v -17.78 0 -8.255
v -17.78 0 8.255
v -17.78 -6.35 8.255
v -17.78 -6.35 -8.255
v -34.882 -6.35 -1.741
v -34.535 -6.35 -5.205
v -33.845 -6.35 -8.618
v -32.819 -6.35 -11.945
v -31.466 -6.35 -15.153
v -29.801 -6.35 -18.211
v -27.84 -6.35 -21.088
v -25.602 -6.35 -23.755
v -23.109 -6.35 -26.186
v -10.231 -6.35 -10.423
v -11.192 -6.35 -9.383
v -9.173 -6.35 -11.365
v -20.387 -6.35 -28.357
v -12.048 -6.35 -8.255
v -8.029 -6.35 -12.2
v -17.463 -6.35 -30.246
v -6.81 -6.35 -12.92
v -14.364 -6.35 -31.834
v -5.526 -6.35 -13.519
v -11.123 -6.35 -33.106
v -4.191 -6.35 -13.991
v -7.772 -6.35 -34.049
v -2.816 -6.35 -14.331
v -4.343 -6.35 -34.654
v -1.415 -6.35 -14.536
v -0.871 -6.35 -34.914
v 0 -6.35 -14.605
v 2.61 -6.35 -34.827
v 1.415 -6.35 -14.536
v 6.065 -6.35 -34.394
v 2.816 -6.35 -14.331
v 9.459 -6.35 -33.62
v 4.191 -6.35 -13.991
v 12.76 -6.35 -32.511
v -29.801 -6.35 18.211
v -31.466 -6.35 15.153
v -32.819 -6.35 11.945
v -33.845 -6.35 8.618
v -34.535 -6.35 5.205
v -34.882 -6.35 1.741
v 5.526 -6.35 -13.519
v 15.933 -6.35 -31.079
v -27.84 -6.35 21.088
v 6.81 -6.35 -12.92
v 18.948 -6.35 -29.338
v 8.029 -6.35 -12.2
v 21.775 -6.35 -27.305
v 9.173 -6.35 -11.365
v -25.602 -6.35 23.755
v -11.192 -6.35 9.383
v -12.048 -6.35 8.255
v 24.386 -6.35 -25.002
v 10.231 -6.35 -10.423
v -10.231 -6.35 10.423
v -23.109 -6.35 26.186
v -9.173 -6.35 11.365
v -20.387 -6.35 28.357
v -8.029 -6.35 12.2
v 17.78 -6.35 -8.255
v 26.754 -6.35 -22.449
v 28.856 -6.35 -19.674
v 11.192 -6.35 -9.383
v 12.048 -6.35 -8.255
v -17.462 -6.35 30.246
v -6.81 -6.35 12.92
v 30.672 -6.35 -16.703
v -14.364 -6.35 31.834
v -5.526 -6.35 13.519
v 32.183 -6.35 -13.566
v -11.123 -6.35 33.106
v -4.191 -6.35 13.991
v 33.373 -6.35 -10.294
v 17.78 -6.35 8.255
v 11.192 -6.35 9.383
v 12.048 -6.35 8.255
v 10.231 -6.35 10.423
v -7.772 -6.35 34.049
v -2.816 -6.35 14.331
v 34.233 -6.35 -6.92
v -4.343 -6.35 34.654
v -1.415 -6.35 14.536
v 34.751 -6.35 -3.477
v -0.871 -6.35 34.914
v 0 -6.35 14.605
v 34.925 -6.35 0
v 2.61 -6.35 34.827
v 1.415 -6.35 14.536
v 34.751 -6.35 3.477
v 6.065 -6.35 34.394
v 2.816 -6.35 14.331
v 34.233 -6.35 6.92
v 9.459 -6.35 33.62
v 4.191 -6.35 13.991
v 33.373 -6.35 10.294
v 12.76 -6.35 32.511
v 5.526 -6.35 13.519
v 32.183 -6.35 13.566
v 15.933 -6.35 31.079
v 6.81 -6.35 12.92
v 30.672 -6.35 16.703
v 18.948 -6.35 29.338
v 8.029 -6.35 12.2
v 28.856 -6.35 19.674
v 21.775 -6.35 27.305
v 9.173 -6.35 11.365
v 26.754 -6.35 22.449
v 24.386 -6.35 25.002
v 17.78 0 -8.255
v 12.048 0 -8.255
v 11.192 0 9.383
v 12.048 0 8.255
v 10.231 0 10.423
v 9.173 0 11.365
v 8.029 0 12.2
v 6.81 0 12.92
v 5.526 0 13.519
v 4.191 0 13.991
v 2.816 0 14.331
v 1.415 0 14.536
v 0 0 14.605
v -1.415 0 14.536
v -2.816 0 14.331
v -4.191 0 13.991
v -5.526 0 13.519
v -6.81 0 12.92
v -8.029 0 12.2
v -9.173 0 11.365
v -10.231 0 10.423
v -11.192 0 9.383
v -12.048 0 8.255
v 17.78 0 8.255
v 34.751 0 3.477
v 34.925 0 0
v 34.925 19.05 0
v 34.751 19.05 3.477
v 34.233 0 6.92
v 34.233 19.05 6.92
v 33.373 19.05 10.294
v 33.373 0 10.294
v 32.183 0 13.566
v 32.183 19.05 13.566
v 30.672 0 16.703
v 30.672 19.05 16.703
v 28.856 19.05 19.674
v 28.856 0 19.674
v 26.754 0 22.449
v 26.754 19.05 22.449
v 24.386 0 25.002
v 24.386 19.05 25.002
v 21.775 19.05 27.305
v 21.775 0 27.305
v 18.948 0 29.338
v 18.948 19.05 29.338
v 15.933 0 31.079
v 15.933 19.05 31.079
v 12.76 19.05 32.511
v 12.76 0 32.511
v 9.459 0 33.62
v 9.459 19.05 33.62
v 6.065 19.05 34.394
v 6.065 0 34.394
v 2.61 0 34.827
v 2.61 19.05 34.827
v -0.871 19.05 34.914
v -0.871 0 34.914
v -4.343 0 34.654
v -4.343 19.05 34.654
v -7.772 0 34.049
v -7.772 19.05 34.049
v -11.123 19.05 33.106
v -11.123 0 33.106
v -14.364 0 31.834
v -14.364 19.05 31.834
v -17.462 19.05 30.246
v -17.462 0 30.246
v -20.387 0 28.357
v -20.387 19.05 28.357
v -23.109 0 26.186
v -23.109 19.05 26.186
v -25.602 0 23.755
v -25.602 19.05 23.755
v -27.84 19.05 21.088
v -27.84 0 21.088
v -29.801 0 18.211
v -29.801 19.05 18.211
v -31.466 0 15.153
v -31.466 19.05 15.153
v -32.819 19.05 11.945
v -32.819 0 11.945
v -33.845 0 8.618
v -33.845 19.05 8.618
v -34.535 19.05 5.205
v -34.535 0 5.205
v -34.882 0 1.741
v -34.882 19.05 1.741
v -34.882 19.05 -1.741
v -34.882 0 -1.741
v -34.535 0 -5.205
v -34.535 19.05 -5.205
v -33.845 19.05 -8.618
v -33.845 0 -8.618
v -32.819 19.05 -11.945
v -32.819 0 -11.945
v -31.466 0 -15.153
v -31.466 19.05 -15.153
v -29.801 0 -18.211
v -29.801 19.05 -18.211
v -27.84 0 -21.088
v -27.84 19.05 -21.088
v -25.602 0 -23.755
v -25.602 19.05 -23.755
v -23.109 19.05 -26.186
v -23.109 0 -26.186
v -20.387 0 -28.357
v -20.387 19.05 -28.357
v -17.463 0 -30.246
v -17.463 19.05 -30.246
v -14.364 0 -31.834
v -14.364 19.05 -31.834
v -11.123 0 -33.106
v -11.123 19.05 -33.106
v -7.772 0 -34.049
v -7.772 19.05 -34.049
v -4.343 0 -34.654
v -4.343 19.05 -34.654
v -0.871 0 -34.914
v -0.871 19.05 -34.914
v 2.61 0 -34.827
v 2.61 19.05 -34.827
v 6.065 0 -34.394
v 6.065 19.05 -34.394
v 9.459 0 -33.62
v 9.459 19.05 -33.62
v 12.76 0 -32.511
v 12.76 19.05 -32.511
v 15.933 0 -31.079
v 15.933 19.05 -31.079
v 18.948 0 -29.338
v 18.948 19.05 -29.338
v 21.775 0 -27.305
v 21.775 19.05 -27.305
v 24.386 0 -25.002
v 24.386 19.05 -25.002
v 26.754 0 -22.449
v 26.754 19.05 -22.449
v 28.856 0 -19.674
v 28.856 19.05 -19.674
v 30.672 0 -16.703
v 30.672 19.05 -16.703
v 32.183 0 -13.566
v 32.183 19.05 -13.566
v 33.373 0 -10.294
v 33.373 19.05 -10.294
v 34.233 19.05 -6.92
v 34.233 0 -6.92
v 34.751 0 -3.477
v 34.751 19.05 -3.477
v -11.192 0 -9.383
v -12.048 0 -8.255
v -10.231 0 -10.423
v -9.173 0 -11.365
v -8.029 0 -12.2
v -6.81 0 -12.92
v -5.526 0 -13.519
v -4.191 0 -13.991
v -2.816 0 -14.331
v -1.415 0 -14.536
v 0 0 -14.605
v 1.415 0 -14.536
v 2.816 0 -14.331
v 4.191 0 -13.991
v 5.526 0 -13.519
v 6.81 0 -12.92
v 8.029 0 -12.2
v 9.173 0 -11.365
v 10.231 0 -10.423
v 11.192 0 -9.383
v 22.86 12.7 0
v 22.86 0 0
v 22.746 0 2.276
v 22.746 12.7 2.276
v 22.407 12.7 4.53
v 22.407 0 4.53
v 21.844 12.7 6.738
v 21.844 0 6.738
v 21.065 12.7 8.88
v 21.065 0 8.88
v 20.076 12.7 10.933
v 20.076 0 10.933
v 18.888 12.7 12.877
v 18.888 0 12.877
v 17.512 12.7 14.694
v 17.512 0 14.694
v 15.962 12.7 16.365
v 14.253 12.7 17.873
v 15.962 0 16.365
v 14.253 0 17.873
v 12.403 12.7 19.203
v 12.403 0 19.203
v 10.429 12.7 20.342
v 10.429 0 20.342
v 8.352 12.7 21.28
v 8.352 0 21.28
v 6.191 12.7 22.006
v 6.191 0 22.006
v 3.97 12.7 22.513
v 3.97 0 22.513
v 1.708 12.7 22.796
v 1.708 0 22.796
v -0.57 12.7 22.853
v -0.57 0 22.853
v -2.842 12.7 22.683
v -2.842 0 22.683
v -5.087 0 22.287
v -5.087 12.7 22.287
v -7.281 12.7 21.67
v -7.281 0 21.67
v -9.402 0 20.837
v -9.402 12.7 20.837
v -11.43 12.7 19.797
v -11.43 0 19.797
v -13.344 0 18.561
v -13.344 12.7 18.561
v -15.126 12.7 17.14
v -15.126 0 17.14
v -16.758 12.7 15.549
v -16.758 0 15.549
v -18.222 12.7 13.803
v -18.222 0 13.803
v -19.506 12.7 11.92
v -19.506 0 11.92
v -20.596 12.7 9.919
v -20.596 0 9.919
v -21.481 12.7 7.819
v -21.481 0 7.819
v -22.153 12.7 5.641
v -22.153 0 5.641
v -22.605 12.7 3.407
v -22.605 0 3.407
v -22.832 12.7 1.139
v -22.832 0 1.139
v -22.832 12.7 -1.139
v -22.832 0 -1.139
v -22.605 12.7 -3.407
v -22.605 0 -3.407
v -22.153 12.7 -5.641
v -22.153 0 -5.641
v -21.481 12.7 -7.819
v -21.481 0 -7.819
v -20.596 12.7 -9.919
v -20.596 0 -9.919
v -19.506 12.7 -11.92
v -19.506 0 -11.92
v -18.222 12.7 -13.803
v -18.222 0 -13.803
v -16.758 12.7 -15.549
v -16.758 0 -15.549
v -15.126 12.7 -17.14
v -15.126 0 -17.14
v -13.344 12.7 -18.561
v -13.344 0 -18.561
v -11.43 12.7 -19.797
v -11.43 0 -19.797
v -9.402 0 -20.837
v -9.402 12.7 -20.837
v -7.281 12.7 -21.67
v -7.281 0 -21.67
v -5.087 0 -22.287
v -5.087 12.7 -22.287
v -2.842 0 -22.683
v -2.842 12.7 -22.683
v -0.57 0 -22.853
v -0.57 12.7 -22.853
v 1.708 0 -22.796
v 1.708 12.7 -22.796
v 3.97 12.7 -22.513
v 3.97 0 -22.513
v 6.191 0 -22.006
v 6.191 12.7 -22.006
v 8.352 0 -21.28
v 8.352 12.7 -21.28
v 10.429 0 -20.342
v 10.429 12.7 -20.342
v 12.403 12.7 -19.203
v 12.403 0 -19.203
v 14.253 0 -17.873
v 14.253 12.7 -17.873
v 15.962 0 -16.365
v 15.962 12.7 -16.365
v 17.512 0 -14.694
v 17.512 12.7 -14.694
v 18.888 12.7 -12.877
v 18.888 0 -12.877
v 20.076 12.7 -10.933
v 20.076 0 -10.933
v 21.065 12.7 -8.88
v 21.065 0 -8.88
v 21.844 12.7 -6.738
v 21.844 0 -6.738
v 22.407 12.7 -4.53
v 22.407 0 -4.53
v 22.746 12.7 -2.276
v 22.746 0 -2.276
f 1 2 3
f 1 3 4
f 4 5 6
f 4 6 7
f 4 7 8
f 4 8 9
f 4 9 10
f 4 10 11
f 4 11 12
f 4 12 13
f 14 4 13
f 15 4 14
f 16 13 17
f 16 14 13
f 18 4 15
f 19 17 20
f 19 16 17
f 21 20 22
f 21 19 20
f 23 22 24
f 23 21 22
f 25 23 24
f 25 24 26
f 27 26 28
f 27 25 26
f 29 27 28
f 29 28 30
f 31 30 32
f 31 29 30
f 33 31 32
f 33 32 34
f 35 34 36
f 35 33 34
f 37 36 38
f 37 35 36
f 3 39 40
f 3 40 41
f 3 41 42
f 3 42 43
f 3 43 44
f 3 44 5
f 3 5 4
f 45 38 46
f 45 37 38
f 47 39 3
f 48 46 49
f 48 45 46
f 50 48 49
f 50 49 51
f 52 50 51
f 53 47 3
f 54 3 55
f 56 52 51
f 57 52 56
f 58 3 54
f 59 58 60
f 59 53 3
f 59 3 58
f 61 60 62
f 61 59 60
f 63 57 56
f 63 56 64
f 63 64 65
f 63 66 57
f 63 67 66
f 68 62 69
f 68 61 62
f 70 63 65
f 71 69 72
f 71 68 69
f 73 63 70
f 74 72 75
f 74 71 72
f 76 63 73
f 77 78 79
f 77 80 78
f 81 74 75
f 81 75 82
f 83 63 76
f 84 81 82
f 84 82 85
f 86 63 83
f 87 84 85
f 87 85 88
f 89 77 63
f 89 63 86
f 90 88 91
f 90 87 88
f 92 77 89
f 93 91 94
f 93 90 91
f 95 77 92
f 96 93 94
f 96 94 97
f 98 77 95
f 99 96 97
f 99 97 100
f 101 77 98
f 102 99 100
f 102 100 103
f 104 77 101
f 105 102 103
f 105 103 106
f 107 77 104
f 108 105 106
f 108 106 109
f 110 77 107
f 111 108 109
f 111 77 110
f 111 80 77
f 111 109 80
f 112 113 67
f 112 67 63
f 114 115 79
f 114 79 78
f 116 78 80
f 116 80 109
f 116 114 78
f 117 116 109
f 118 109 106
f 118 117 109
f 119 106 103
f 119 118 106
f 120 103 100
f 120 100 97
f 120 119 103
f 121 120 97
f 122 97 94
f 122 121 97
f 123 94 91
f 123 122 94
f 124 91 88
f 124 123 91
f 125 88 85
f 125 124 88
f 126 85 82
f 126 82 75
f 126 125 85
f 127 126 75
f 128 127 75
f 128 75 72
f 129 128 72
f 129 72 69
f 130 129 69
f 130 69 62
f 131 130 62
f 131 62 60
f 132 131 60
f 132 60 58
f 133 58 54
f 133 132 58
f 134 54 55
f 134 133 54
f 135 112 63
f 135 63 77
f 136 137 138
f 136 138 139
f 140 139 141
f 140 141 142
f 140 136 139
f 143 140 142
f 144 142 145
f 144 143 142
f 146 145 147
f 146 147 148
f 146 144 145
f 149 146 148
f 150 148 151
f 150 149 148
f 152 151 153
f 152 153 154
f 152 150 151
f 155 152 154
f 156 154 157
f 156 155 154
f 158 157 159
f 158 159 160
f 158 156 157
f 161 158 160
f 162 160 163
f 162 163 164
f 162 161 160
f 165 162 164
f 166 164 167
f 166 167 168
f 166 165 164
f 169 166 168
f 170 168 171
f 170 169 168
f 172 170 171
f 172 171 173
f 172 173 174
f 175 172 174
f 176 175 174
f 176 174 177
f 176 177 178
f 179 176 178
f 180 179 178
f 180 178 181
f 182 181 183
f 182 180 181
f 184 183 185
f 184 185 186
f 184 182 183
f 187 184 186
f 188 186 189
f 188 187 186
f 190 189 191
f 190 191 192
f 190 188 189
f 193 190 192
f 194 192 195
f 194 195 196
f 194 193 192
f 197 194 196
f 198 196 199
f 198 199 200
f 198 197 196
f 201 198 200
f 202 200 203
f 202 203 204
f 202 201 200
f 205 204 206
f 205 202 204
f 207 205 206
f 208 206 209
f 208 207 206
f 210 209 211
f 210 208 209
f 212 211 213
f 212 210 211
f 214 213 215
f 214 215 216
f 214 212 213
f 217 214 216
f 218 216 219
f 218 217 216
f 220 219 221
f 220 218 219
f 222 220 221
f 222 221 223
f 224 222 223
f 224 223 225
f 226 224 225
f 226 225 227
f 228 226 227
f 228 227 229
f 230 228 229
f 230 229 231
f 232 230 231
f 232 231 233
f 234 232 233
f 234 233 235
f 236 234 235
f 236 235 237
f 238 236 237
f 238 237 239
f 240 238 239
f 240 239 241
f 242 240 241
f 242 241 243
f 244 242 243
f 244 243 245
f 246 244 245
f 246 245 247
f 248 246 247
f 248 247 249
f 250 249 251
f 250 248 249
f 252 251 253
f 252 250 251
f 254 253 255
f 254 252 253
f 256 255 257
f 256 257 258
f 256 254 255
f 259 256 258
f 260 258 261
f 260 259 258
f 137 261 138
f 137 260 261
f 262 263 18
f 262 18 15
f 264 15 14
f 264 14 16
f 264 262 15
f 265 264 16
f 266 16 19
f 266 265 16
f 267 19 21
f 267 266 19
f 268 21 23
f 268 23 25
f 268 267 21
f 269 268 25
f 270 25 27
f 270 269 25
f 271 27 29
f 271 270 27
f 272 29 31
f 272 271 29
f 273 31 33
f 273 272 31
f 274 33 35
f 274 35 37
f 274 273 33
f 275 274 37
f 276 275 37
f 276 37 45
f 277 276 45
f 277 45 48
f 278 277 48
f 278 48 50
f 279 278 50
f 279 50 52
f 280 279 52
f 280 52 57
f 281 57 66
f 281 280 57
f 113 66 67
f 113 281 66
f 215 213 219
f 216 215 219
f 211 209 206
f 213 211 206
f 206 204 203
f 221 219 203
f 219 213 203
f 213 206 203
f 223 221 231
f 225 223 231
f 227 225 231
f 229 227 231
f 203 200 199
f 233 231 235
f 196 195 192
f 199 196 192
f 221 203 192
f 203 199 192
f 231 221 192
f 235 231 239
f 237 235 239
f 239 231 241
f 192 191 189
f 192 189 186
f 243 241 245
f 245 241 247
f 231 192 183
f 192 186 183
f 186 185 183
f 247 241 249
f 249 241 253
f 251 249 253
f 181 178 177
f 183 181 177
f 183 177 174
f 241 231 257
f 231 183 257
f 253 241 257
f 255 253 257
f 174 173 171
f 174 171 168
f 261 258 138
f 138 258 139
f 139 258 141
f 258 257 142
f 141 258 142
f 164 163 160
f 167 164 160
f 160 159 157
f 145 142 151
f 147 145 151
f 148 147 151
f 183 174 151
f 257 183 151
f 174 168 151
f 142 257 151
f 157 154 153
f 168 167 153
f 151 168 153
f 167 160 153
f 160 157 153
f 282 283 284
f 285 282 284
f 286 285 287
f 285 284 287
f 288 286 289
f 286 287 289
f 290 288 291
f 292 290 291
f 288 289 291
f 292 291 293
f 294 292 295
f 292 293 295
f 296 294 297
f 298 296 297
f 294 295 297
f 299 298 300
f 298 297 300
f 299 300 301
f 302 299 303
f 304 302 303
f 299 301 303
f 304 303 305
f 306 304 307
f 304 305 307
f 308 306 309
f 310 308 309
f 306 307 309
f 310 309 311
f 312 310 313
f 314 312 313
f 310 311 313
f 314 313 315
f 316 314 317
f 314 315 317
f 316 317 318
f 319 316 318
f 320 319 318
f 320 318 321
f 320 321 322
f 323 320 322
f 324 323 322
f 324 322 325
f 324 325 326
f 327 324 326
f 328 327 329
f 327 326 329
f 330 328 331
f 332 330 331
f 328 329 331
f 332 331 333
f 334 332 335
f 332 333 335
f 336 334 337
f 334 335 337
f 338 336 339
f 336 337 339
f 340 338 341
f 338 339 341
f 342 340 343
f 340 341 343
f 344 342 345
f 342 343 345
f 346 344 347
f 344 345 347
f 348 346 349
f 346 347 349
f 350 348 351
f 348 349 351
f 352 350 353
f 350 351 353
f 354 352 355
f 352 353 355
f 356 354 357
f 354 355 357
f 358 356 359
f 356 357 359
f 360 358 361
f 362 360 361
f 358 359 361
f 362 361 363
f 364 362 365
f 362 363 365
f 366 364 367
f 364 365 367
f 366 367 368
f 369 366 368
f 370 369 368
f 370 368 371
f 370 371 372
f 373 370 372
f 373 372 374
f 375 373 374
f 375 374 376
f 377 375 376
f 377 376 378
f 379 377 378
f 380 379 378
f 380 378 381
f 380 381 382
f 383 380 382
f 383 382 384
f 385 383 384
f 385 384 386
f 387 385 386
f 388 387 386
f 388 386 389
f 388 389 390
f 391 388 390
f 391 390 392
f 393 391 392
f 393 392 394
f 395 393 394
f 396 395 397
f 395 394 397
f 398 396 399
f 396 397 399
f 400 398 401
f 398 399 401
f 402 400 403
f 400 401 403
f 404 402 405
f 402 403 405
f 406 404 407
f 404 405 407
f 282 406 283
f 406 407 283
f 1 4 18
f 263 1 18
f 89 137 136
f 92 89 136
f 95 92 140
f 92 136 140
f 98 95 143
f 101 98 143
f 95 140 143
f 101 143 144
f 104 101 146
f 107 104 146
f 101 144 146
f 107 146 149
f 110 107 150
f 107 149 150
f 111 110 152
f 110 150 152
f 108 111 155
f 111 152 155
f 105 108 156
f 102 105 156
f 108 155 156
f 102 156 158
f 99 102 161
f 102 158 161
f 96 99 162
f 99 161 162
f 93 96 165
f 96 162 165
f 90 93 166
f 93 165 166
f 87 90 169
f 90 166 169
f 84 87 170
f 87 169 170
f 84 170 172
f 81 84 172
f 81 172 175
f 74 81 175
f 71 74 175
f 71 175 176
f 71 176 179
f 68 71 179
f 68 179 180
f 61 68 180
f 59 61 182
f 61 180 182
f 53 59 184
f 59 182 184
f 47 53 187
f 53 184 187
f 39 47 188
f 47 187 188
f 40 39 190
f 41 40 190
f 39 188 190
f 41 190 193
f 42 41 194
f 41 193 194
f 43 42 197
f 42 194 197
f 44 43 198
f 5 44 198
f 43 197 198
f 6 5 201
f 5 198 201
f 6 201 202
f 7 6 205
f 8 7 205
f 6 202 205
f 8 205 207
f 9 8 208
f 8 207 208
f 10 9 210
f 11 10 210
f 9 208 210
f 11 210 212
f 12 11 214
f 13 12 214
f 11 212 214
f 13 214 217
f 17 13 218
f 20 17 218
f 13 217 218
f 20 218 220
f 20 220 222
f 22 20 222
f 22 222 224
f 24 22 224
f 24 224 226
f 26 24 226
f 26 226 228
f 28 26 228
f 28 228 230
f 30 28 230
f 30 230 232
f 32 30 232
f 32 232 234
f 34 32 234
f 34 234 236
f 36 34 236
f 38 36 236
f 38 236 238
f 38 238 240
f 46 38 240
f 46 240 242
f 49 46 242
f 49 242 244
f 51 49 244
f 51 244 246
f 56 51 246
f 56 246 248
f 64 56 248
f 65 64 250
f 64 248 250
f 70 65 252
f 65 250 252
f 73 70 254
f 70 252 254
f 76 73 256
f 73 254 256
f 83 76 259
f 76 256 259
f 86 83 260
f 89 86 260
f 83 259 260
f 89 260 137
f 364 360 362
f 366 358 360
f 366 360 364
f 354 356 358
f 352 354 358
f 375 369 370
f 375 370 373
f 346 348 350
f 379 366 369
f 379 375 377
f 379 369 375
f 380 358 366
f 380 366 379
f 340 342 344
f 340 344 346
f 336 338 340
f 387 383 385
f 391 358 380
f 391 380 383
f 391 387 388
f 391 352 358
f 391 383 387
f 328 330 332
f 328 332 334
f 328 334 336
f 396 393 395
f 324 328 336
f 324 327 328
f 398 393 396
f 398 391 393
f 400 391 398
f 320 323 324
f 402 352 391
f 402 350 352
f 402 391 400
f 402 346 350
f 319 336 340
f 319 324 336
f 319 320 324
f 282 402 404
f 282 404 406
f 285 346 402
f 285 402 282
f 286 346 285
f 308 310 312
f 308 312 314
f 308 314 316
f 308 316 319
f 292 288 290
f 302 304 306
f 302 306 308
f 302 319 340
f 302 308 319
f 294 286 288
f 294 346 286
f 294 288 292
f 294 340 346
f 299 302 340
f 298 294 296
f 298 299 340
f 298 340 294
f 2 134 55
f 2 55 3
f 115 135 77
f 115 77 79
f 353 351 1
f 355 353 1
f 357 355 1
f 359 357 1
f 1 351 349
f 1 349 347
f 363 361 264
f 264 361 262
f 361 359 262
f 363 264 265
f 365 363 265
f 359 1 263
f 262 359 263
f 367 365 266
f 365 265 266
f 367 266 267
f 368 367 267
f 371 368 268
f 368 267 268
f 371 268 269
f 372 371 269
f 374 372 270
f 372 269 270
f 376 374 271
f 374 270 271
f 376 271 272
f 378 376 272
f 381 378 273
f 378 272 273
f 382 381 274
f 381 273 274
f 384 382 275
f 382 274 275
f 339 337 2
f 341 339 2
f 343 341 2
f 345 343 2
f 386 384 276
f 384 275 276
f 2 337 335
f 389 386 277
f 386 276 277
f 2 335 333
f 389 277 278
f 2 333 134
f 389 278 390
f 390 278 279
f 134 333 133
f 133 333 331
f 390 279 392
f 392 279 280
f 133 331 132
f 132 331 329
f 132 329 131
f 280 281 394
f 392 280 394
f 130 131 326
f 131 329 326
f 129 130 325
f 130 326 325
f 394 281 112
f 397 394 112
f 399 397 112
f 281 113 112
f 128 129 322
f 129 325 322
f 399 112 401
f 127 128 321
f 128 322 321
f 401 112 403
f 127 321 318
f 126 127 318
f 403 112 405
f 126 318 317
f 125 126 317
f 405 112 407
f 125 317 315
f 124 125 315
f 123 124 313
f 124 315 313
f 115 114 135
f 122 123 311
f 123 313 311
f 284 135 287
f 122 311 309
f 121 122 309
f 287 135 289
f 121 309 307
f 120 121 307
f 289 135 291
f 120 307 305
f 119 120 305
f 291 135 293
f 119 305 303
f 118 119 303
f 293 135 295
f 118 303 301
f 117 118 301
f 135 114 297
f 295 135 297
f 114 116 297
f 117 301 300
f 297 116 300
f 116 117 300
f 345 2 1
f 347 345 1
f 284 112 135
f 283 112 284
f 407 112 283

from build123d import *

# Parameters (mm, degrees)
F0_R     = 34.925
F1_DEPTH = 19.05
F2_R     = 22.86
F3_DEPTH = 12.7
F4_R     = 34.925
F5_DEPTH = 6.35
F7_DEPTH = 6.35


with BuildPart() as f1:
    # F0 (on Front) → F1 (new body)
    with BuildSketch(Plane.XZ):
        Circle(F0_R)
    extrude(amount=-F1_DEPTH)

    # F2 (on Front) → F3 (cut)
    with BuildSketch(Plane.XZ):
        Circle(F2_R)
    extrude(amount=-F3_DEPTH, mode=Mode.SUBTRACT)

    # F4 (on Front) → F5 (join)
    with BuildSketch(Plane.XZ):
        Circle(F4_R)
    extrude(amount=F5_DEPTH)

    # F6 (on Front) → F7 (cut)
    with BuildSketch(Plane.XZ):
        with BuildLine():
            Line((12.0482778852, -8.255), (17.78, -8.255))
            Line((17.78, -8.255), (17.78, 8.255))
            Line((17.78, 8.255), (12.0482778852, 8.255))
            ThreePointArc((12.0482778852, 8.255), (13.9511849589, 4.3209331449), (14.605, 0))
            ThreePointArc((14.605, 0), (13.9511849589, -4.3209331449), (12.0482778852, -8.255))
        make_face()
        with BuildLine():
            ThreePointArc((-12.0482778852, -8.255), (0, -14.605), (12.0482778852, -8.255))
            Line((12.0482778852, -8.255), (-12.0482778852, -8.255))
        make_face()
        with BuildLine():
            Line((-12.0482778852, -8.255), (12.0482778852, -8.255))
            ThreePointArc((12.0482778852, -8.255), (13.9511849589, -4.3209331449), (14.605, 0))
            ThreePointArc((14.605, 0), (13.9511849589, 4.3209331449), (12.0482778852, 8.255))
            Line((12.0482778852, 8.255), (-12.0482778852, 8.255))
            ThreePointArc((-12.0482778852, 8.255), (-14.605, 0), (-12.0482778852, -8.255))
        make_face()
        with BuildLine():
            Line((-17.78, -8.255), (-12.0482778852, -8.255))
            ThreePointArc((-12.0482778852, -8.255), (-14.605, 0), (-12.0482778852, 8.255))
            Line((-12.0482778852, 8.255), (-17.78, 8.255))
            Line((-17.78, 8.255), (-17.78, -8.255))
        make_face()
        with BuildLine():
            Line((-12.0482778852, 8.255), (12.0482778852, 8.255))
            ThreePointArc((12.0482778852, 8.255), (0, 14.605), (-12.0482778852, 8.255))
        make_face()
    extrude(amount=F7_DEPTH, mode=Mode.SUBTRACT)


solid = f1.part
